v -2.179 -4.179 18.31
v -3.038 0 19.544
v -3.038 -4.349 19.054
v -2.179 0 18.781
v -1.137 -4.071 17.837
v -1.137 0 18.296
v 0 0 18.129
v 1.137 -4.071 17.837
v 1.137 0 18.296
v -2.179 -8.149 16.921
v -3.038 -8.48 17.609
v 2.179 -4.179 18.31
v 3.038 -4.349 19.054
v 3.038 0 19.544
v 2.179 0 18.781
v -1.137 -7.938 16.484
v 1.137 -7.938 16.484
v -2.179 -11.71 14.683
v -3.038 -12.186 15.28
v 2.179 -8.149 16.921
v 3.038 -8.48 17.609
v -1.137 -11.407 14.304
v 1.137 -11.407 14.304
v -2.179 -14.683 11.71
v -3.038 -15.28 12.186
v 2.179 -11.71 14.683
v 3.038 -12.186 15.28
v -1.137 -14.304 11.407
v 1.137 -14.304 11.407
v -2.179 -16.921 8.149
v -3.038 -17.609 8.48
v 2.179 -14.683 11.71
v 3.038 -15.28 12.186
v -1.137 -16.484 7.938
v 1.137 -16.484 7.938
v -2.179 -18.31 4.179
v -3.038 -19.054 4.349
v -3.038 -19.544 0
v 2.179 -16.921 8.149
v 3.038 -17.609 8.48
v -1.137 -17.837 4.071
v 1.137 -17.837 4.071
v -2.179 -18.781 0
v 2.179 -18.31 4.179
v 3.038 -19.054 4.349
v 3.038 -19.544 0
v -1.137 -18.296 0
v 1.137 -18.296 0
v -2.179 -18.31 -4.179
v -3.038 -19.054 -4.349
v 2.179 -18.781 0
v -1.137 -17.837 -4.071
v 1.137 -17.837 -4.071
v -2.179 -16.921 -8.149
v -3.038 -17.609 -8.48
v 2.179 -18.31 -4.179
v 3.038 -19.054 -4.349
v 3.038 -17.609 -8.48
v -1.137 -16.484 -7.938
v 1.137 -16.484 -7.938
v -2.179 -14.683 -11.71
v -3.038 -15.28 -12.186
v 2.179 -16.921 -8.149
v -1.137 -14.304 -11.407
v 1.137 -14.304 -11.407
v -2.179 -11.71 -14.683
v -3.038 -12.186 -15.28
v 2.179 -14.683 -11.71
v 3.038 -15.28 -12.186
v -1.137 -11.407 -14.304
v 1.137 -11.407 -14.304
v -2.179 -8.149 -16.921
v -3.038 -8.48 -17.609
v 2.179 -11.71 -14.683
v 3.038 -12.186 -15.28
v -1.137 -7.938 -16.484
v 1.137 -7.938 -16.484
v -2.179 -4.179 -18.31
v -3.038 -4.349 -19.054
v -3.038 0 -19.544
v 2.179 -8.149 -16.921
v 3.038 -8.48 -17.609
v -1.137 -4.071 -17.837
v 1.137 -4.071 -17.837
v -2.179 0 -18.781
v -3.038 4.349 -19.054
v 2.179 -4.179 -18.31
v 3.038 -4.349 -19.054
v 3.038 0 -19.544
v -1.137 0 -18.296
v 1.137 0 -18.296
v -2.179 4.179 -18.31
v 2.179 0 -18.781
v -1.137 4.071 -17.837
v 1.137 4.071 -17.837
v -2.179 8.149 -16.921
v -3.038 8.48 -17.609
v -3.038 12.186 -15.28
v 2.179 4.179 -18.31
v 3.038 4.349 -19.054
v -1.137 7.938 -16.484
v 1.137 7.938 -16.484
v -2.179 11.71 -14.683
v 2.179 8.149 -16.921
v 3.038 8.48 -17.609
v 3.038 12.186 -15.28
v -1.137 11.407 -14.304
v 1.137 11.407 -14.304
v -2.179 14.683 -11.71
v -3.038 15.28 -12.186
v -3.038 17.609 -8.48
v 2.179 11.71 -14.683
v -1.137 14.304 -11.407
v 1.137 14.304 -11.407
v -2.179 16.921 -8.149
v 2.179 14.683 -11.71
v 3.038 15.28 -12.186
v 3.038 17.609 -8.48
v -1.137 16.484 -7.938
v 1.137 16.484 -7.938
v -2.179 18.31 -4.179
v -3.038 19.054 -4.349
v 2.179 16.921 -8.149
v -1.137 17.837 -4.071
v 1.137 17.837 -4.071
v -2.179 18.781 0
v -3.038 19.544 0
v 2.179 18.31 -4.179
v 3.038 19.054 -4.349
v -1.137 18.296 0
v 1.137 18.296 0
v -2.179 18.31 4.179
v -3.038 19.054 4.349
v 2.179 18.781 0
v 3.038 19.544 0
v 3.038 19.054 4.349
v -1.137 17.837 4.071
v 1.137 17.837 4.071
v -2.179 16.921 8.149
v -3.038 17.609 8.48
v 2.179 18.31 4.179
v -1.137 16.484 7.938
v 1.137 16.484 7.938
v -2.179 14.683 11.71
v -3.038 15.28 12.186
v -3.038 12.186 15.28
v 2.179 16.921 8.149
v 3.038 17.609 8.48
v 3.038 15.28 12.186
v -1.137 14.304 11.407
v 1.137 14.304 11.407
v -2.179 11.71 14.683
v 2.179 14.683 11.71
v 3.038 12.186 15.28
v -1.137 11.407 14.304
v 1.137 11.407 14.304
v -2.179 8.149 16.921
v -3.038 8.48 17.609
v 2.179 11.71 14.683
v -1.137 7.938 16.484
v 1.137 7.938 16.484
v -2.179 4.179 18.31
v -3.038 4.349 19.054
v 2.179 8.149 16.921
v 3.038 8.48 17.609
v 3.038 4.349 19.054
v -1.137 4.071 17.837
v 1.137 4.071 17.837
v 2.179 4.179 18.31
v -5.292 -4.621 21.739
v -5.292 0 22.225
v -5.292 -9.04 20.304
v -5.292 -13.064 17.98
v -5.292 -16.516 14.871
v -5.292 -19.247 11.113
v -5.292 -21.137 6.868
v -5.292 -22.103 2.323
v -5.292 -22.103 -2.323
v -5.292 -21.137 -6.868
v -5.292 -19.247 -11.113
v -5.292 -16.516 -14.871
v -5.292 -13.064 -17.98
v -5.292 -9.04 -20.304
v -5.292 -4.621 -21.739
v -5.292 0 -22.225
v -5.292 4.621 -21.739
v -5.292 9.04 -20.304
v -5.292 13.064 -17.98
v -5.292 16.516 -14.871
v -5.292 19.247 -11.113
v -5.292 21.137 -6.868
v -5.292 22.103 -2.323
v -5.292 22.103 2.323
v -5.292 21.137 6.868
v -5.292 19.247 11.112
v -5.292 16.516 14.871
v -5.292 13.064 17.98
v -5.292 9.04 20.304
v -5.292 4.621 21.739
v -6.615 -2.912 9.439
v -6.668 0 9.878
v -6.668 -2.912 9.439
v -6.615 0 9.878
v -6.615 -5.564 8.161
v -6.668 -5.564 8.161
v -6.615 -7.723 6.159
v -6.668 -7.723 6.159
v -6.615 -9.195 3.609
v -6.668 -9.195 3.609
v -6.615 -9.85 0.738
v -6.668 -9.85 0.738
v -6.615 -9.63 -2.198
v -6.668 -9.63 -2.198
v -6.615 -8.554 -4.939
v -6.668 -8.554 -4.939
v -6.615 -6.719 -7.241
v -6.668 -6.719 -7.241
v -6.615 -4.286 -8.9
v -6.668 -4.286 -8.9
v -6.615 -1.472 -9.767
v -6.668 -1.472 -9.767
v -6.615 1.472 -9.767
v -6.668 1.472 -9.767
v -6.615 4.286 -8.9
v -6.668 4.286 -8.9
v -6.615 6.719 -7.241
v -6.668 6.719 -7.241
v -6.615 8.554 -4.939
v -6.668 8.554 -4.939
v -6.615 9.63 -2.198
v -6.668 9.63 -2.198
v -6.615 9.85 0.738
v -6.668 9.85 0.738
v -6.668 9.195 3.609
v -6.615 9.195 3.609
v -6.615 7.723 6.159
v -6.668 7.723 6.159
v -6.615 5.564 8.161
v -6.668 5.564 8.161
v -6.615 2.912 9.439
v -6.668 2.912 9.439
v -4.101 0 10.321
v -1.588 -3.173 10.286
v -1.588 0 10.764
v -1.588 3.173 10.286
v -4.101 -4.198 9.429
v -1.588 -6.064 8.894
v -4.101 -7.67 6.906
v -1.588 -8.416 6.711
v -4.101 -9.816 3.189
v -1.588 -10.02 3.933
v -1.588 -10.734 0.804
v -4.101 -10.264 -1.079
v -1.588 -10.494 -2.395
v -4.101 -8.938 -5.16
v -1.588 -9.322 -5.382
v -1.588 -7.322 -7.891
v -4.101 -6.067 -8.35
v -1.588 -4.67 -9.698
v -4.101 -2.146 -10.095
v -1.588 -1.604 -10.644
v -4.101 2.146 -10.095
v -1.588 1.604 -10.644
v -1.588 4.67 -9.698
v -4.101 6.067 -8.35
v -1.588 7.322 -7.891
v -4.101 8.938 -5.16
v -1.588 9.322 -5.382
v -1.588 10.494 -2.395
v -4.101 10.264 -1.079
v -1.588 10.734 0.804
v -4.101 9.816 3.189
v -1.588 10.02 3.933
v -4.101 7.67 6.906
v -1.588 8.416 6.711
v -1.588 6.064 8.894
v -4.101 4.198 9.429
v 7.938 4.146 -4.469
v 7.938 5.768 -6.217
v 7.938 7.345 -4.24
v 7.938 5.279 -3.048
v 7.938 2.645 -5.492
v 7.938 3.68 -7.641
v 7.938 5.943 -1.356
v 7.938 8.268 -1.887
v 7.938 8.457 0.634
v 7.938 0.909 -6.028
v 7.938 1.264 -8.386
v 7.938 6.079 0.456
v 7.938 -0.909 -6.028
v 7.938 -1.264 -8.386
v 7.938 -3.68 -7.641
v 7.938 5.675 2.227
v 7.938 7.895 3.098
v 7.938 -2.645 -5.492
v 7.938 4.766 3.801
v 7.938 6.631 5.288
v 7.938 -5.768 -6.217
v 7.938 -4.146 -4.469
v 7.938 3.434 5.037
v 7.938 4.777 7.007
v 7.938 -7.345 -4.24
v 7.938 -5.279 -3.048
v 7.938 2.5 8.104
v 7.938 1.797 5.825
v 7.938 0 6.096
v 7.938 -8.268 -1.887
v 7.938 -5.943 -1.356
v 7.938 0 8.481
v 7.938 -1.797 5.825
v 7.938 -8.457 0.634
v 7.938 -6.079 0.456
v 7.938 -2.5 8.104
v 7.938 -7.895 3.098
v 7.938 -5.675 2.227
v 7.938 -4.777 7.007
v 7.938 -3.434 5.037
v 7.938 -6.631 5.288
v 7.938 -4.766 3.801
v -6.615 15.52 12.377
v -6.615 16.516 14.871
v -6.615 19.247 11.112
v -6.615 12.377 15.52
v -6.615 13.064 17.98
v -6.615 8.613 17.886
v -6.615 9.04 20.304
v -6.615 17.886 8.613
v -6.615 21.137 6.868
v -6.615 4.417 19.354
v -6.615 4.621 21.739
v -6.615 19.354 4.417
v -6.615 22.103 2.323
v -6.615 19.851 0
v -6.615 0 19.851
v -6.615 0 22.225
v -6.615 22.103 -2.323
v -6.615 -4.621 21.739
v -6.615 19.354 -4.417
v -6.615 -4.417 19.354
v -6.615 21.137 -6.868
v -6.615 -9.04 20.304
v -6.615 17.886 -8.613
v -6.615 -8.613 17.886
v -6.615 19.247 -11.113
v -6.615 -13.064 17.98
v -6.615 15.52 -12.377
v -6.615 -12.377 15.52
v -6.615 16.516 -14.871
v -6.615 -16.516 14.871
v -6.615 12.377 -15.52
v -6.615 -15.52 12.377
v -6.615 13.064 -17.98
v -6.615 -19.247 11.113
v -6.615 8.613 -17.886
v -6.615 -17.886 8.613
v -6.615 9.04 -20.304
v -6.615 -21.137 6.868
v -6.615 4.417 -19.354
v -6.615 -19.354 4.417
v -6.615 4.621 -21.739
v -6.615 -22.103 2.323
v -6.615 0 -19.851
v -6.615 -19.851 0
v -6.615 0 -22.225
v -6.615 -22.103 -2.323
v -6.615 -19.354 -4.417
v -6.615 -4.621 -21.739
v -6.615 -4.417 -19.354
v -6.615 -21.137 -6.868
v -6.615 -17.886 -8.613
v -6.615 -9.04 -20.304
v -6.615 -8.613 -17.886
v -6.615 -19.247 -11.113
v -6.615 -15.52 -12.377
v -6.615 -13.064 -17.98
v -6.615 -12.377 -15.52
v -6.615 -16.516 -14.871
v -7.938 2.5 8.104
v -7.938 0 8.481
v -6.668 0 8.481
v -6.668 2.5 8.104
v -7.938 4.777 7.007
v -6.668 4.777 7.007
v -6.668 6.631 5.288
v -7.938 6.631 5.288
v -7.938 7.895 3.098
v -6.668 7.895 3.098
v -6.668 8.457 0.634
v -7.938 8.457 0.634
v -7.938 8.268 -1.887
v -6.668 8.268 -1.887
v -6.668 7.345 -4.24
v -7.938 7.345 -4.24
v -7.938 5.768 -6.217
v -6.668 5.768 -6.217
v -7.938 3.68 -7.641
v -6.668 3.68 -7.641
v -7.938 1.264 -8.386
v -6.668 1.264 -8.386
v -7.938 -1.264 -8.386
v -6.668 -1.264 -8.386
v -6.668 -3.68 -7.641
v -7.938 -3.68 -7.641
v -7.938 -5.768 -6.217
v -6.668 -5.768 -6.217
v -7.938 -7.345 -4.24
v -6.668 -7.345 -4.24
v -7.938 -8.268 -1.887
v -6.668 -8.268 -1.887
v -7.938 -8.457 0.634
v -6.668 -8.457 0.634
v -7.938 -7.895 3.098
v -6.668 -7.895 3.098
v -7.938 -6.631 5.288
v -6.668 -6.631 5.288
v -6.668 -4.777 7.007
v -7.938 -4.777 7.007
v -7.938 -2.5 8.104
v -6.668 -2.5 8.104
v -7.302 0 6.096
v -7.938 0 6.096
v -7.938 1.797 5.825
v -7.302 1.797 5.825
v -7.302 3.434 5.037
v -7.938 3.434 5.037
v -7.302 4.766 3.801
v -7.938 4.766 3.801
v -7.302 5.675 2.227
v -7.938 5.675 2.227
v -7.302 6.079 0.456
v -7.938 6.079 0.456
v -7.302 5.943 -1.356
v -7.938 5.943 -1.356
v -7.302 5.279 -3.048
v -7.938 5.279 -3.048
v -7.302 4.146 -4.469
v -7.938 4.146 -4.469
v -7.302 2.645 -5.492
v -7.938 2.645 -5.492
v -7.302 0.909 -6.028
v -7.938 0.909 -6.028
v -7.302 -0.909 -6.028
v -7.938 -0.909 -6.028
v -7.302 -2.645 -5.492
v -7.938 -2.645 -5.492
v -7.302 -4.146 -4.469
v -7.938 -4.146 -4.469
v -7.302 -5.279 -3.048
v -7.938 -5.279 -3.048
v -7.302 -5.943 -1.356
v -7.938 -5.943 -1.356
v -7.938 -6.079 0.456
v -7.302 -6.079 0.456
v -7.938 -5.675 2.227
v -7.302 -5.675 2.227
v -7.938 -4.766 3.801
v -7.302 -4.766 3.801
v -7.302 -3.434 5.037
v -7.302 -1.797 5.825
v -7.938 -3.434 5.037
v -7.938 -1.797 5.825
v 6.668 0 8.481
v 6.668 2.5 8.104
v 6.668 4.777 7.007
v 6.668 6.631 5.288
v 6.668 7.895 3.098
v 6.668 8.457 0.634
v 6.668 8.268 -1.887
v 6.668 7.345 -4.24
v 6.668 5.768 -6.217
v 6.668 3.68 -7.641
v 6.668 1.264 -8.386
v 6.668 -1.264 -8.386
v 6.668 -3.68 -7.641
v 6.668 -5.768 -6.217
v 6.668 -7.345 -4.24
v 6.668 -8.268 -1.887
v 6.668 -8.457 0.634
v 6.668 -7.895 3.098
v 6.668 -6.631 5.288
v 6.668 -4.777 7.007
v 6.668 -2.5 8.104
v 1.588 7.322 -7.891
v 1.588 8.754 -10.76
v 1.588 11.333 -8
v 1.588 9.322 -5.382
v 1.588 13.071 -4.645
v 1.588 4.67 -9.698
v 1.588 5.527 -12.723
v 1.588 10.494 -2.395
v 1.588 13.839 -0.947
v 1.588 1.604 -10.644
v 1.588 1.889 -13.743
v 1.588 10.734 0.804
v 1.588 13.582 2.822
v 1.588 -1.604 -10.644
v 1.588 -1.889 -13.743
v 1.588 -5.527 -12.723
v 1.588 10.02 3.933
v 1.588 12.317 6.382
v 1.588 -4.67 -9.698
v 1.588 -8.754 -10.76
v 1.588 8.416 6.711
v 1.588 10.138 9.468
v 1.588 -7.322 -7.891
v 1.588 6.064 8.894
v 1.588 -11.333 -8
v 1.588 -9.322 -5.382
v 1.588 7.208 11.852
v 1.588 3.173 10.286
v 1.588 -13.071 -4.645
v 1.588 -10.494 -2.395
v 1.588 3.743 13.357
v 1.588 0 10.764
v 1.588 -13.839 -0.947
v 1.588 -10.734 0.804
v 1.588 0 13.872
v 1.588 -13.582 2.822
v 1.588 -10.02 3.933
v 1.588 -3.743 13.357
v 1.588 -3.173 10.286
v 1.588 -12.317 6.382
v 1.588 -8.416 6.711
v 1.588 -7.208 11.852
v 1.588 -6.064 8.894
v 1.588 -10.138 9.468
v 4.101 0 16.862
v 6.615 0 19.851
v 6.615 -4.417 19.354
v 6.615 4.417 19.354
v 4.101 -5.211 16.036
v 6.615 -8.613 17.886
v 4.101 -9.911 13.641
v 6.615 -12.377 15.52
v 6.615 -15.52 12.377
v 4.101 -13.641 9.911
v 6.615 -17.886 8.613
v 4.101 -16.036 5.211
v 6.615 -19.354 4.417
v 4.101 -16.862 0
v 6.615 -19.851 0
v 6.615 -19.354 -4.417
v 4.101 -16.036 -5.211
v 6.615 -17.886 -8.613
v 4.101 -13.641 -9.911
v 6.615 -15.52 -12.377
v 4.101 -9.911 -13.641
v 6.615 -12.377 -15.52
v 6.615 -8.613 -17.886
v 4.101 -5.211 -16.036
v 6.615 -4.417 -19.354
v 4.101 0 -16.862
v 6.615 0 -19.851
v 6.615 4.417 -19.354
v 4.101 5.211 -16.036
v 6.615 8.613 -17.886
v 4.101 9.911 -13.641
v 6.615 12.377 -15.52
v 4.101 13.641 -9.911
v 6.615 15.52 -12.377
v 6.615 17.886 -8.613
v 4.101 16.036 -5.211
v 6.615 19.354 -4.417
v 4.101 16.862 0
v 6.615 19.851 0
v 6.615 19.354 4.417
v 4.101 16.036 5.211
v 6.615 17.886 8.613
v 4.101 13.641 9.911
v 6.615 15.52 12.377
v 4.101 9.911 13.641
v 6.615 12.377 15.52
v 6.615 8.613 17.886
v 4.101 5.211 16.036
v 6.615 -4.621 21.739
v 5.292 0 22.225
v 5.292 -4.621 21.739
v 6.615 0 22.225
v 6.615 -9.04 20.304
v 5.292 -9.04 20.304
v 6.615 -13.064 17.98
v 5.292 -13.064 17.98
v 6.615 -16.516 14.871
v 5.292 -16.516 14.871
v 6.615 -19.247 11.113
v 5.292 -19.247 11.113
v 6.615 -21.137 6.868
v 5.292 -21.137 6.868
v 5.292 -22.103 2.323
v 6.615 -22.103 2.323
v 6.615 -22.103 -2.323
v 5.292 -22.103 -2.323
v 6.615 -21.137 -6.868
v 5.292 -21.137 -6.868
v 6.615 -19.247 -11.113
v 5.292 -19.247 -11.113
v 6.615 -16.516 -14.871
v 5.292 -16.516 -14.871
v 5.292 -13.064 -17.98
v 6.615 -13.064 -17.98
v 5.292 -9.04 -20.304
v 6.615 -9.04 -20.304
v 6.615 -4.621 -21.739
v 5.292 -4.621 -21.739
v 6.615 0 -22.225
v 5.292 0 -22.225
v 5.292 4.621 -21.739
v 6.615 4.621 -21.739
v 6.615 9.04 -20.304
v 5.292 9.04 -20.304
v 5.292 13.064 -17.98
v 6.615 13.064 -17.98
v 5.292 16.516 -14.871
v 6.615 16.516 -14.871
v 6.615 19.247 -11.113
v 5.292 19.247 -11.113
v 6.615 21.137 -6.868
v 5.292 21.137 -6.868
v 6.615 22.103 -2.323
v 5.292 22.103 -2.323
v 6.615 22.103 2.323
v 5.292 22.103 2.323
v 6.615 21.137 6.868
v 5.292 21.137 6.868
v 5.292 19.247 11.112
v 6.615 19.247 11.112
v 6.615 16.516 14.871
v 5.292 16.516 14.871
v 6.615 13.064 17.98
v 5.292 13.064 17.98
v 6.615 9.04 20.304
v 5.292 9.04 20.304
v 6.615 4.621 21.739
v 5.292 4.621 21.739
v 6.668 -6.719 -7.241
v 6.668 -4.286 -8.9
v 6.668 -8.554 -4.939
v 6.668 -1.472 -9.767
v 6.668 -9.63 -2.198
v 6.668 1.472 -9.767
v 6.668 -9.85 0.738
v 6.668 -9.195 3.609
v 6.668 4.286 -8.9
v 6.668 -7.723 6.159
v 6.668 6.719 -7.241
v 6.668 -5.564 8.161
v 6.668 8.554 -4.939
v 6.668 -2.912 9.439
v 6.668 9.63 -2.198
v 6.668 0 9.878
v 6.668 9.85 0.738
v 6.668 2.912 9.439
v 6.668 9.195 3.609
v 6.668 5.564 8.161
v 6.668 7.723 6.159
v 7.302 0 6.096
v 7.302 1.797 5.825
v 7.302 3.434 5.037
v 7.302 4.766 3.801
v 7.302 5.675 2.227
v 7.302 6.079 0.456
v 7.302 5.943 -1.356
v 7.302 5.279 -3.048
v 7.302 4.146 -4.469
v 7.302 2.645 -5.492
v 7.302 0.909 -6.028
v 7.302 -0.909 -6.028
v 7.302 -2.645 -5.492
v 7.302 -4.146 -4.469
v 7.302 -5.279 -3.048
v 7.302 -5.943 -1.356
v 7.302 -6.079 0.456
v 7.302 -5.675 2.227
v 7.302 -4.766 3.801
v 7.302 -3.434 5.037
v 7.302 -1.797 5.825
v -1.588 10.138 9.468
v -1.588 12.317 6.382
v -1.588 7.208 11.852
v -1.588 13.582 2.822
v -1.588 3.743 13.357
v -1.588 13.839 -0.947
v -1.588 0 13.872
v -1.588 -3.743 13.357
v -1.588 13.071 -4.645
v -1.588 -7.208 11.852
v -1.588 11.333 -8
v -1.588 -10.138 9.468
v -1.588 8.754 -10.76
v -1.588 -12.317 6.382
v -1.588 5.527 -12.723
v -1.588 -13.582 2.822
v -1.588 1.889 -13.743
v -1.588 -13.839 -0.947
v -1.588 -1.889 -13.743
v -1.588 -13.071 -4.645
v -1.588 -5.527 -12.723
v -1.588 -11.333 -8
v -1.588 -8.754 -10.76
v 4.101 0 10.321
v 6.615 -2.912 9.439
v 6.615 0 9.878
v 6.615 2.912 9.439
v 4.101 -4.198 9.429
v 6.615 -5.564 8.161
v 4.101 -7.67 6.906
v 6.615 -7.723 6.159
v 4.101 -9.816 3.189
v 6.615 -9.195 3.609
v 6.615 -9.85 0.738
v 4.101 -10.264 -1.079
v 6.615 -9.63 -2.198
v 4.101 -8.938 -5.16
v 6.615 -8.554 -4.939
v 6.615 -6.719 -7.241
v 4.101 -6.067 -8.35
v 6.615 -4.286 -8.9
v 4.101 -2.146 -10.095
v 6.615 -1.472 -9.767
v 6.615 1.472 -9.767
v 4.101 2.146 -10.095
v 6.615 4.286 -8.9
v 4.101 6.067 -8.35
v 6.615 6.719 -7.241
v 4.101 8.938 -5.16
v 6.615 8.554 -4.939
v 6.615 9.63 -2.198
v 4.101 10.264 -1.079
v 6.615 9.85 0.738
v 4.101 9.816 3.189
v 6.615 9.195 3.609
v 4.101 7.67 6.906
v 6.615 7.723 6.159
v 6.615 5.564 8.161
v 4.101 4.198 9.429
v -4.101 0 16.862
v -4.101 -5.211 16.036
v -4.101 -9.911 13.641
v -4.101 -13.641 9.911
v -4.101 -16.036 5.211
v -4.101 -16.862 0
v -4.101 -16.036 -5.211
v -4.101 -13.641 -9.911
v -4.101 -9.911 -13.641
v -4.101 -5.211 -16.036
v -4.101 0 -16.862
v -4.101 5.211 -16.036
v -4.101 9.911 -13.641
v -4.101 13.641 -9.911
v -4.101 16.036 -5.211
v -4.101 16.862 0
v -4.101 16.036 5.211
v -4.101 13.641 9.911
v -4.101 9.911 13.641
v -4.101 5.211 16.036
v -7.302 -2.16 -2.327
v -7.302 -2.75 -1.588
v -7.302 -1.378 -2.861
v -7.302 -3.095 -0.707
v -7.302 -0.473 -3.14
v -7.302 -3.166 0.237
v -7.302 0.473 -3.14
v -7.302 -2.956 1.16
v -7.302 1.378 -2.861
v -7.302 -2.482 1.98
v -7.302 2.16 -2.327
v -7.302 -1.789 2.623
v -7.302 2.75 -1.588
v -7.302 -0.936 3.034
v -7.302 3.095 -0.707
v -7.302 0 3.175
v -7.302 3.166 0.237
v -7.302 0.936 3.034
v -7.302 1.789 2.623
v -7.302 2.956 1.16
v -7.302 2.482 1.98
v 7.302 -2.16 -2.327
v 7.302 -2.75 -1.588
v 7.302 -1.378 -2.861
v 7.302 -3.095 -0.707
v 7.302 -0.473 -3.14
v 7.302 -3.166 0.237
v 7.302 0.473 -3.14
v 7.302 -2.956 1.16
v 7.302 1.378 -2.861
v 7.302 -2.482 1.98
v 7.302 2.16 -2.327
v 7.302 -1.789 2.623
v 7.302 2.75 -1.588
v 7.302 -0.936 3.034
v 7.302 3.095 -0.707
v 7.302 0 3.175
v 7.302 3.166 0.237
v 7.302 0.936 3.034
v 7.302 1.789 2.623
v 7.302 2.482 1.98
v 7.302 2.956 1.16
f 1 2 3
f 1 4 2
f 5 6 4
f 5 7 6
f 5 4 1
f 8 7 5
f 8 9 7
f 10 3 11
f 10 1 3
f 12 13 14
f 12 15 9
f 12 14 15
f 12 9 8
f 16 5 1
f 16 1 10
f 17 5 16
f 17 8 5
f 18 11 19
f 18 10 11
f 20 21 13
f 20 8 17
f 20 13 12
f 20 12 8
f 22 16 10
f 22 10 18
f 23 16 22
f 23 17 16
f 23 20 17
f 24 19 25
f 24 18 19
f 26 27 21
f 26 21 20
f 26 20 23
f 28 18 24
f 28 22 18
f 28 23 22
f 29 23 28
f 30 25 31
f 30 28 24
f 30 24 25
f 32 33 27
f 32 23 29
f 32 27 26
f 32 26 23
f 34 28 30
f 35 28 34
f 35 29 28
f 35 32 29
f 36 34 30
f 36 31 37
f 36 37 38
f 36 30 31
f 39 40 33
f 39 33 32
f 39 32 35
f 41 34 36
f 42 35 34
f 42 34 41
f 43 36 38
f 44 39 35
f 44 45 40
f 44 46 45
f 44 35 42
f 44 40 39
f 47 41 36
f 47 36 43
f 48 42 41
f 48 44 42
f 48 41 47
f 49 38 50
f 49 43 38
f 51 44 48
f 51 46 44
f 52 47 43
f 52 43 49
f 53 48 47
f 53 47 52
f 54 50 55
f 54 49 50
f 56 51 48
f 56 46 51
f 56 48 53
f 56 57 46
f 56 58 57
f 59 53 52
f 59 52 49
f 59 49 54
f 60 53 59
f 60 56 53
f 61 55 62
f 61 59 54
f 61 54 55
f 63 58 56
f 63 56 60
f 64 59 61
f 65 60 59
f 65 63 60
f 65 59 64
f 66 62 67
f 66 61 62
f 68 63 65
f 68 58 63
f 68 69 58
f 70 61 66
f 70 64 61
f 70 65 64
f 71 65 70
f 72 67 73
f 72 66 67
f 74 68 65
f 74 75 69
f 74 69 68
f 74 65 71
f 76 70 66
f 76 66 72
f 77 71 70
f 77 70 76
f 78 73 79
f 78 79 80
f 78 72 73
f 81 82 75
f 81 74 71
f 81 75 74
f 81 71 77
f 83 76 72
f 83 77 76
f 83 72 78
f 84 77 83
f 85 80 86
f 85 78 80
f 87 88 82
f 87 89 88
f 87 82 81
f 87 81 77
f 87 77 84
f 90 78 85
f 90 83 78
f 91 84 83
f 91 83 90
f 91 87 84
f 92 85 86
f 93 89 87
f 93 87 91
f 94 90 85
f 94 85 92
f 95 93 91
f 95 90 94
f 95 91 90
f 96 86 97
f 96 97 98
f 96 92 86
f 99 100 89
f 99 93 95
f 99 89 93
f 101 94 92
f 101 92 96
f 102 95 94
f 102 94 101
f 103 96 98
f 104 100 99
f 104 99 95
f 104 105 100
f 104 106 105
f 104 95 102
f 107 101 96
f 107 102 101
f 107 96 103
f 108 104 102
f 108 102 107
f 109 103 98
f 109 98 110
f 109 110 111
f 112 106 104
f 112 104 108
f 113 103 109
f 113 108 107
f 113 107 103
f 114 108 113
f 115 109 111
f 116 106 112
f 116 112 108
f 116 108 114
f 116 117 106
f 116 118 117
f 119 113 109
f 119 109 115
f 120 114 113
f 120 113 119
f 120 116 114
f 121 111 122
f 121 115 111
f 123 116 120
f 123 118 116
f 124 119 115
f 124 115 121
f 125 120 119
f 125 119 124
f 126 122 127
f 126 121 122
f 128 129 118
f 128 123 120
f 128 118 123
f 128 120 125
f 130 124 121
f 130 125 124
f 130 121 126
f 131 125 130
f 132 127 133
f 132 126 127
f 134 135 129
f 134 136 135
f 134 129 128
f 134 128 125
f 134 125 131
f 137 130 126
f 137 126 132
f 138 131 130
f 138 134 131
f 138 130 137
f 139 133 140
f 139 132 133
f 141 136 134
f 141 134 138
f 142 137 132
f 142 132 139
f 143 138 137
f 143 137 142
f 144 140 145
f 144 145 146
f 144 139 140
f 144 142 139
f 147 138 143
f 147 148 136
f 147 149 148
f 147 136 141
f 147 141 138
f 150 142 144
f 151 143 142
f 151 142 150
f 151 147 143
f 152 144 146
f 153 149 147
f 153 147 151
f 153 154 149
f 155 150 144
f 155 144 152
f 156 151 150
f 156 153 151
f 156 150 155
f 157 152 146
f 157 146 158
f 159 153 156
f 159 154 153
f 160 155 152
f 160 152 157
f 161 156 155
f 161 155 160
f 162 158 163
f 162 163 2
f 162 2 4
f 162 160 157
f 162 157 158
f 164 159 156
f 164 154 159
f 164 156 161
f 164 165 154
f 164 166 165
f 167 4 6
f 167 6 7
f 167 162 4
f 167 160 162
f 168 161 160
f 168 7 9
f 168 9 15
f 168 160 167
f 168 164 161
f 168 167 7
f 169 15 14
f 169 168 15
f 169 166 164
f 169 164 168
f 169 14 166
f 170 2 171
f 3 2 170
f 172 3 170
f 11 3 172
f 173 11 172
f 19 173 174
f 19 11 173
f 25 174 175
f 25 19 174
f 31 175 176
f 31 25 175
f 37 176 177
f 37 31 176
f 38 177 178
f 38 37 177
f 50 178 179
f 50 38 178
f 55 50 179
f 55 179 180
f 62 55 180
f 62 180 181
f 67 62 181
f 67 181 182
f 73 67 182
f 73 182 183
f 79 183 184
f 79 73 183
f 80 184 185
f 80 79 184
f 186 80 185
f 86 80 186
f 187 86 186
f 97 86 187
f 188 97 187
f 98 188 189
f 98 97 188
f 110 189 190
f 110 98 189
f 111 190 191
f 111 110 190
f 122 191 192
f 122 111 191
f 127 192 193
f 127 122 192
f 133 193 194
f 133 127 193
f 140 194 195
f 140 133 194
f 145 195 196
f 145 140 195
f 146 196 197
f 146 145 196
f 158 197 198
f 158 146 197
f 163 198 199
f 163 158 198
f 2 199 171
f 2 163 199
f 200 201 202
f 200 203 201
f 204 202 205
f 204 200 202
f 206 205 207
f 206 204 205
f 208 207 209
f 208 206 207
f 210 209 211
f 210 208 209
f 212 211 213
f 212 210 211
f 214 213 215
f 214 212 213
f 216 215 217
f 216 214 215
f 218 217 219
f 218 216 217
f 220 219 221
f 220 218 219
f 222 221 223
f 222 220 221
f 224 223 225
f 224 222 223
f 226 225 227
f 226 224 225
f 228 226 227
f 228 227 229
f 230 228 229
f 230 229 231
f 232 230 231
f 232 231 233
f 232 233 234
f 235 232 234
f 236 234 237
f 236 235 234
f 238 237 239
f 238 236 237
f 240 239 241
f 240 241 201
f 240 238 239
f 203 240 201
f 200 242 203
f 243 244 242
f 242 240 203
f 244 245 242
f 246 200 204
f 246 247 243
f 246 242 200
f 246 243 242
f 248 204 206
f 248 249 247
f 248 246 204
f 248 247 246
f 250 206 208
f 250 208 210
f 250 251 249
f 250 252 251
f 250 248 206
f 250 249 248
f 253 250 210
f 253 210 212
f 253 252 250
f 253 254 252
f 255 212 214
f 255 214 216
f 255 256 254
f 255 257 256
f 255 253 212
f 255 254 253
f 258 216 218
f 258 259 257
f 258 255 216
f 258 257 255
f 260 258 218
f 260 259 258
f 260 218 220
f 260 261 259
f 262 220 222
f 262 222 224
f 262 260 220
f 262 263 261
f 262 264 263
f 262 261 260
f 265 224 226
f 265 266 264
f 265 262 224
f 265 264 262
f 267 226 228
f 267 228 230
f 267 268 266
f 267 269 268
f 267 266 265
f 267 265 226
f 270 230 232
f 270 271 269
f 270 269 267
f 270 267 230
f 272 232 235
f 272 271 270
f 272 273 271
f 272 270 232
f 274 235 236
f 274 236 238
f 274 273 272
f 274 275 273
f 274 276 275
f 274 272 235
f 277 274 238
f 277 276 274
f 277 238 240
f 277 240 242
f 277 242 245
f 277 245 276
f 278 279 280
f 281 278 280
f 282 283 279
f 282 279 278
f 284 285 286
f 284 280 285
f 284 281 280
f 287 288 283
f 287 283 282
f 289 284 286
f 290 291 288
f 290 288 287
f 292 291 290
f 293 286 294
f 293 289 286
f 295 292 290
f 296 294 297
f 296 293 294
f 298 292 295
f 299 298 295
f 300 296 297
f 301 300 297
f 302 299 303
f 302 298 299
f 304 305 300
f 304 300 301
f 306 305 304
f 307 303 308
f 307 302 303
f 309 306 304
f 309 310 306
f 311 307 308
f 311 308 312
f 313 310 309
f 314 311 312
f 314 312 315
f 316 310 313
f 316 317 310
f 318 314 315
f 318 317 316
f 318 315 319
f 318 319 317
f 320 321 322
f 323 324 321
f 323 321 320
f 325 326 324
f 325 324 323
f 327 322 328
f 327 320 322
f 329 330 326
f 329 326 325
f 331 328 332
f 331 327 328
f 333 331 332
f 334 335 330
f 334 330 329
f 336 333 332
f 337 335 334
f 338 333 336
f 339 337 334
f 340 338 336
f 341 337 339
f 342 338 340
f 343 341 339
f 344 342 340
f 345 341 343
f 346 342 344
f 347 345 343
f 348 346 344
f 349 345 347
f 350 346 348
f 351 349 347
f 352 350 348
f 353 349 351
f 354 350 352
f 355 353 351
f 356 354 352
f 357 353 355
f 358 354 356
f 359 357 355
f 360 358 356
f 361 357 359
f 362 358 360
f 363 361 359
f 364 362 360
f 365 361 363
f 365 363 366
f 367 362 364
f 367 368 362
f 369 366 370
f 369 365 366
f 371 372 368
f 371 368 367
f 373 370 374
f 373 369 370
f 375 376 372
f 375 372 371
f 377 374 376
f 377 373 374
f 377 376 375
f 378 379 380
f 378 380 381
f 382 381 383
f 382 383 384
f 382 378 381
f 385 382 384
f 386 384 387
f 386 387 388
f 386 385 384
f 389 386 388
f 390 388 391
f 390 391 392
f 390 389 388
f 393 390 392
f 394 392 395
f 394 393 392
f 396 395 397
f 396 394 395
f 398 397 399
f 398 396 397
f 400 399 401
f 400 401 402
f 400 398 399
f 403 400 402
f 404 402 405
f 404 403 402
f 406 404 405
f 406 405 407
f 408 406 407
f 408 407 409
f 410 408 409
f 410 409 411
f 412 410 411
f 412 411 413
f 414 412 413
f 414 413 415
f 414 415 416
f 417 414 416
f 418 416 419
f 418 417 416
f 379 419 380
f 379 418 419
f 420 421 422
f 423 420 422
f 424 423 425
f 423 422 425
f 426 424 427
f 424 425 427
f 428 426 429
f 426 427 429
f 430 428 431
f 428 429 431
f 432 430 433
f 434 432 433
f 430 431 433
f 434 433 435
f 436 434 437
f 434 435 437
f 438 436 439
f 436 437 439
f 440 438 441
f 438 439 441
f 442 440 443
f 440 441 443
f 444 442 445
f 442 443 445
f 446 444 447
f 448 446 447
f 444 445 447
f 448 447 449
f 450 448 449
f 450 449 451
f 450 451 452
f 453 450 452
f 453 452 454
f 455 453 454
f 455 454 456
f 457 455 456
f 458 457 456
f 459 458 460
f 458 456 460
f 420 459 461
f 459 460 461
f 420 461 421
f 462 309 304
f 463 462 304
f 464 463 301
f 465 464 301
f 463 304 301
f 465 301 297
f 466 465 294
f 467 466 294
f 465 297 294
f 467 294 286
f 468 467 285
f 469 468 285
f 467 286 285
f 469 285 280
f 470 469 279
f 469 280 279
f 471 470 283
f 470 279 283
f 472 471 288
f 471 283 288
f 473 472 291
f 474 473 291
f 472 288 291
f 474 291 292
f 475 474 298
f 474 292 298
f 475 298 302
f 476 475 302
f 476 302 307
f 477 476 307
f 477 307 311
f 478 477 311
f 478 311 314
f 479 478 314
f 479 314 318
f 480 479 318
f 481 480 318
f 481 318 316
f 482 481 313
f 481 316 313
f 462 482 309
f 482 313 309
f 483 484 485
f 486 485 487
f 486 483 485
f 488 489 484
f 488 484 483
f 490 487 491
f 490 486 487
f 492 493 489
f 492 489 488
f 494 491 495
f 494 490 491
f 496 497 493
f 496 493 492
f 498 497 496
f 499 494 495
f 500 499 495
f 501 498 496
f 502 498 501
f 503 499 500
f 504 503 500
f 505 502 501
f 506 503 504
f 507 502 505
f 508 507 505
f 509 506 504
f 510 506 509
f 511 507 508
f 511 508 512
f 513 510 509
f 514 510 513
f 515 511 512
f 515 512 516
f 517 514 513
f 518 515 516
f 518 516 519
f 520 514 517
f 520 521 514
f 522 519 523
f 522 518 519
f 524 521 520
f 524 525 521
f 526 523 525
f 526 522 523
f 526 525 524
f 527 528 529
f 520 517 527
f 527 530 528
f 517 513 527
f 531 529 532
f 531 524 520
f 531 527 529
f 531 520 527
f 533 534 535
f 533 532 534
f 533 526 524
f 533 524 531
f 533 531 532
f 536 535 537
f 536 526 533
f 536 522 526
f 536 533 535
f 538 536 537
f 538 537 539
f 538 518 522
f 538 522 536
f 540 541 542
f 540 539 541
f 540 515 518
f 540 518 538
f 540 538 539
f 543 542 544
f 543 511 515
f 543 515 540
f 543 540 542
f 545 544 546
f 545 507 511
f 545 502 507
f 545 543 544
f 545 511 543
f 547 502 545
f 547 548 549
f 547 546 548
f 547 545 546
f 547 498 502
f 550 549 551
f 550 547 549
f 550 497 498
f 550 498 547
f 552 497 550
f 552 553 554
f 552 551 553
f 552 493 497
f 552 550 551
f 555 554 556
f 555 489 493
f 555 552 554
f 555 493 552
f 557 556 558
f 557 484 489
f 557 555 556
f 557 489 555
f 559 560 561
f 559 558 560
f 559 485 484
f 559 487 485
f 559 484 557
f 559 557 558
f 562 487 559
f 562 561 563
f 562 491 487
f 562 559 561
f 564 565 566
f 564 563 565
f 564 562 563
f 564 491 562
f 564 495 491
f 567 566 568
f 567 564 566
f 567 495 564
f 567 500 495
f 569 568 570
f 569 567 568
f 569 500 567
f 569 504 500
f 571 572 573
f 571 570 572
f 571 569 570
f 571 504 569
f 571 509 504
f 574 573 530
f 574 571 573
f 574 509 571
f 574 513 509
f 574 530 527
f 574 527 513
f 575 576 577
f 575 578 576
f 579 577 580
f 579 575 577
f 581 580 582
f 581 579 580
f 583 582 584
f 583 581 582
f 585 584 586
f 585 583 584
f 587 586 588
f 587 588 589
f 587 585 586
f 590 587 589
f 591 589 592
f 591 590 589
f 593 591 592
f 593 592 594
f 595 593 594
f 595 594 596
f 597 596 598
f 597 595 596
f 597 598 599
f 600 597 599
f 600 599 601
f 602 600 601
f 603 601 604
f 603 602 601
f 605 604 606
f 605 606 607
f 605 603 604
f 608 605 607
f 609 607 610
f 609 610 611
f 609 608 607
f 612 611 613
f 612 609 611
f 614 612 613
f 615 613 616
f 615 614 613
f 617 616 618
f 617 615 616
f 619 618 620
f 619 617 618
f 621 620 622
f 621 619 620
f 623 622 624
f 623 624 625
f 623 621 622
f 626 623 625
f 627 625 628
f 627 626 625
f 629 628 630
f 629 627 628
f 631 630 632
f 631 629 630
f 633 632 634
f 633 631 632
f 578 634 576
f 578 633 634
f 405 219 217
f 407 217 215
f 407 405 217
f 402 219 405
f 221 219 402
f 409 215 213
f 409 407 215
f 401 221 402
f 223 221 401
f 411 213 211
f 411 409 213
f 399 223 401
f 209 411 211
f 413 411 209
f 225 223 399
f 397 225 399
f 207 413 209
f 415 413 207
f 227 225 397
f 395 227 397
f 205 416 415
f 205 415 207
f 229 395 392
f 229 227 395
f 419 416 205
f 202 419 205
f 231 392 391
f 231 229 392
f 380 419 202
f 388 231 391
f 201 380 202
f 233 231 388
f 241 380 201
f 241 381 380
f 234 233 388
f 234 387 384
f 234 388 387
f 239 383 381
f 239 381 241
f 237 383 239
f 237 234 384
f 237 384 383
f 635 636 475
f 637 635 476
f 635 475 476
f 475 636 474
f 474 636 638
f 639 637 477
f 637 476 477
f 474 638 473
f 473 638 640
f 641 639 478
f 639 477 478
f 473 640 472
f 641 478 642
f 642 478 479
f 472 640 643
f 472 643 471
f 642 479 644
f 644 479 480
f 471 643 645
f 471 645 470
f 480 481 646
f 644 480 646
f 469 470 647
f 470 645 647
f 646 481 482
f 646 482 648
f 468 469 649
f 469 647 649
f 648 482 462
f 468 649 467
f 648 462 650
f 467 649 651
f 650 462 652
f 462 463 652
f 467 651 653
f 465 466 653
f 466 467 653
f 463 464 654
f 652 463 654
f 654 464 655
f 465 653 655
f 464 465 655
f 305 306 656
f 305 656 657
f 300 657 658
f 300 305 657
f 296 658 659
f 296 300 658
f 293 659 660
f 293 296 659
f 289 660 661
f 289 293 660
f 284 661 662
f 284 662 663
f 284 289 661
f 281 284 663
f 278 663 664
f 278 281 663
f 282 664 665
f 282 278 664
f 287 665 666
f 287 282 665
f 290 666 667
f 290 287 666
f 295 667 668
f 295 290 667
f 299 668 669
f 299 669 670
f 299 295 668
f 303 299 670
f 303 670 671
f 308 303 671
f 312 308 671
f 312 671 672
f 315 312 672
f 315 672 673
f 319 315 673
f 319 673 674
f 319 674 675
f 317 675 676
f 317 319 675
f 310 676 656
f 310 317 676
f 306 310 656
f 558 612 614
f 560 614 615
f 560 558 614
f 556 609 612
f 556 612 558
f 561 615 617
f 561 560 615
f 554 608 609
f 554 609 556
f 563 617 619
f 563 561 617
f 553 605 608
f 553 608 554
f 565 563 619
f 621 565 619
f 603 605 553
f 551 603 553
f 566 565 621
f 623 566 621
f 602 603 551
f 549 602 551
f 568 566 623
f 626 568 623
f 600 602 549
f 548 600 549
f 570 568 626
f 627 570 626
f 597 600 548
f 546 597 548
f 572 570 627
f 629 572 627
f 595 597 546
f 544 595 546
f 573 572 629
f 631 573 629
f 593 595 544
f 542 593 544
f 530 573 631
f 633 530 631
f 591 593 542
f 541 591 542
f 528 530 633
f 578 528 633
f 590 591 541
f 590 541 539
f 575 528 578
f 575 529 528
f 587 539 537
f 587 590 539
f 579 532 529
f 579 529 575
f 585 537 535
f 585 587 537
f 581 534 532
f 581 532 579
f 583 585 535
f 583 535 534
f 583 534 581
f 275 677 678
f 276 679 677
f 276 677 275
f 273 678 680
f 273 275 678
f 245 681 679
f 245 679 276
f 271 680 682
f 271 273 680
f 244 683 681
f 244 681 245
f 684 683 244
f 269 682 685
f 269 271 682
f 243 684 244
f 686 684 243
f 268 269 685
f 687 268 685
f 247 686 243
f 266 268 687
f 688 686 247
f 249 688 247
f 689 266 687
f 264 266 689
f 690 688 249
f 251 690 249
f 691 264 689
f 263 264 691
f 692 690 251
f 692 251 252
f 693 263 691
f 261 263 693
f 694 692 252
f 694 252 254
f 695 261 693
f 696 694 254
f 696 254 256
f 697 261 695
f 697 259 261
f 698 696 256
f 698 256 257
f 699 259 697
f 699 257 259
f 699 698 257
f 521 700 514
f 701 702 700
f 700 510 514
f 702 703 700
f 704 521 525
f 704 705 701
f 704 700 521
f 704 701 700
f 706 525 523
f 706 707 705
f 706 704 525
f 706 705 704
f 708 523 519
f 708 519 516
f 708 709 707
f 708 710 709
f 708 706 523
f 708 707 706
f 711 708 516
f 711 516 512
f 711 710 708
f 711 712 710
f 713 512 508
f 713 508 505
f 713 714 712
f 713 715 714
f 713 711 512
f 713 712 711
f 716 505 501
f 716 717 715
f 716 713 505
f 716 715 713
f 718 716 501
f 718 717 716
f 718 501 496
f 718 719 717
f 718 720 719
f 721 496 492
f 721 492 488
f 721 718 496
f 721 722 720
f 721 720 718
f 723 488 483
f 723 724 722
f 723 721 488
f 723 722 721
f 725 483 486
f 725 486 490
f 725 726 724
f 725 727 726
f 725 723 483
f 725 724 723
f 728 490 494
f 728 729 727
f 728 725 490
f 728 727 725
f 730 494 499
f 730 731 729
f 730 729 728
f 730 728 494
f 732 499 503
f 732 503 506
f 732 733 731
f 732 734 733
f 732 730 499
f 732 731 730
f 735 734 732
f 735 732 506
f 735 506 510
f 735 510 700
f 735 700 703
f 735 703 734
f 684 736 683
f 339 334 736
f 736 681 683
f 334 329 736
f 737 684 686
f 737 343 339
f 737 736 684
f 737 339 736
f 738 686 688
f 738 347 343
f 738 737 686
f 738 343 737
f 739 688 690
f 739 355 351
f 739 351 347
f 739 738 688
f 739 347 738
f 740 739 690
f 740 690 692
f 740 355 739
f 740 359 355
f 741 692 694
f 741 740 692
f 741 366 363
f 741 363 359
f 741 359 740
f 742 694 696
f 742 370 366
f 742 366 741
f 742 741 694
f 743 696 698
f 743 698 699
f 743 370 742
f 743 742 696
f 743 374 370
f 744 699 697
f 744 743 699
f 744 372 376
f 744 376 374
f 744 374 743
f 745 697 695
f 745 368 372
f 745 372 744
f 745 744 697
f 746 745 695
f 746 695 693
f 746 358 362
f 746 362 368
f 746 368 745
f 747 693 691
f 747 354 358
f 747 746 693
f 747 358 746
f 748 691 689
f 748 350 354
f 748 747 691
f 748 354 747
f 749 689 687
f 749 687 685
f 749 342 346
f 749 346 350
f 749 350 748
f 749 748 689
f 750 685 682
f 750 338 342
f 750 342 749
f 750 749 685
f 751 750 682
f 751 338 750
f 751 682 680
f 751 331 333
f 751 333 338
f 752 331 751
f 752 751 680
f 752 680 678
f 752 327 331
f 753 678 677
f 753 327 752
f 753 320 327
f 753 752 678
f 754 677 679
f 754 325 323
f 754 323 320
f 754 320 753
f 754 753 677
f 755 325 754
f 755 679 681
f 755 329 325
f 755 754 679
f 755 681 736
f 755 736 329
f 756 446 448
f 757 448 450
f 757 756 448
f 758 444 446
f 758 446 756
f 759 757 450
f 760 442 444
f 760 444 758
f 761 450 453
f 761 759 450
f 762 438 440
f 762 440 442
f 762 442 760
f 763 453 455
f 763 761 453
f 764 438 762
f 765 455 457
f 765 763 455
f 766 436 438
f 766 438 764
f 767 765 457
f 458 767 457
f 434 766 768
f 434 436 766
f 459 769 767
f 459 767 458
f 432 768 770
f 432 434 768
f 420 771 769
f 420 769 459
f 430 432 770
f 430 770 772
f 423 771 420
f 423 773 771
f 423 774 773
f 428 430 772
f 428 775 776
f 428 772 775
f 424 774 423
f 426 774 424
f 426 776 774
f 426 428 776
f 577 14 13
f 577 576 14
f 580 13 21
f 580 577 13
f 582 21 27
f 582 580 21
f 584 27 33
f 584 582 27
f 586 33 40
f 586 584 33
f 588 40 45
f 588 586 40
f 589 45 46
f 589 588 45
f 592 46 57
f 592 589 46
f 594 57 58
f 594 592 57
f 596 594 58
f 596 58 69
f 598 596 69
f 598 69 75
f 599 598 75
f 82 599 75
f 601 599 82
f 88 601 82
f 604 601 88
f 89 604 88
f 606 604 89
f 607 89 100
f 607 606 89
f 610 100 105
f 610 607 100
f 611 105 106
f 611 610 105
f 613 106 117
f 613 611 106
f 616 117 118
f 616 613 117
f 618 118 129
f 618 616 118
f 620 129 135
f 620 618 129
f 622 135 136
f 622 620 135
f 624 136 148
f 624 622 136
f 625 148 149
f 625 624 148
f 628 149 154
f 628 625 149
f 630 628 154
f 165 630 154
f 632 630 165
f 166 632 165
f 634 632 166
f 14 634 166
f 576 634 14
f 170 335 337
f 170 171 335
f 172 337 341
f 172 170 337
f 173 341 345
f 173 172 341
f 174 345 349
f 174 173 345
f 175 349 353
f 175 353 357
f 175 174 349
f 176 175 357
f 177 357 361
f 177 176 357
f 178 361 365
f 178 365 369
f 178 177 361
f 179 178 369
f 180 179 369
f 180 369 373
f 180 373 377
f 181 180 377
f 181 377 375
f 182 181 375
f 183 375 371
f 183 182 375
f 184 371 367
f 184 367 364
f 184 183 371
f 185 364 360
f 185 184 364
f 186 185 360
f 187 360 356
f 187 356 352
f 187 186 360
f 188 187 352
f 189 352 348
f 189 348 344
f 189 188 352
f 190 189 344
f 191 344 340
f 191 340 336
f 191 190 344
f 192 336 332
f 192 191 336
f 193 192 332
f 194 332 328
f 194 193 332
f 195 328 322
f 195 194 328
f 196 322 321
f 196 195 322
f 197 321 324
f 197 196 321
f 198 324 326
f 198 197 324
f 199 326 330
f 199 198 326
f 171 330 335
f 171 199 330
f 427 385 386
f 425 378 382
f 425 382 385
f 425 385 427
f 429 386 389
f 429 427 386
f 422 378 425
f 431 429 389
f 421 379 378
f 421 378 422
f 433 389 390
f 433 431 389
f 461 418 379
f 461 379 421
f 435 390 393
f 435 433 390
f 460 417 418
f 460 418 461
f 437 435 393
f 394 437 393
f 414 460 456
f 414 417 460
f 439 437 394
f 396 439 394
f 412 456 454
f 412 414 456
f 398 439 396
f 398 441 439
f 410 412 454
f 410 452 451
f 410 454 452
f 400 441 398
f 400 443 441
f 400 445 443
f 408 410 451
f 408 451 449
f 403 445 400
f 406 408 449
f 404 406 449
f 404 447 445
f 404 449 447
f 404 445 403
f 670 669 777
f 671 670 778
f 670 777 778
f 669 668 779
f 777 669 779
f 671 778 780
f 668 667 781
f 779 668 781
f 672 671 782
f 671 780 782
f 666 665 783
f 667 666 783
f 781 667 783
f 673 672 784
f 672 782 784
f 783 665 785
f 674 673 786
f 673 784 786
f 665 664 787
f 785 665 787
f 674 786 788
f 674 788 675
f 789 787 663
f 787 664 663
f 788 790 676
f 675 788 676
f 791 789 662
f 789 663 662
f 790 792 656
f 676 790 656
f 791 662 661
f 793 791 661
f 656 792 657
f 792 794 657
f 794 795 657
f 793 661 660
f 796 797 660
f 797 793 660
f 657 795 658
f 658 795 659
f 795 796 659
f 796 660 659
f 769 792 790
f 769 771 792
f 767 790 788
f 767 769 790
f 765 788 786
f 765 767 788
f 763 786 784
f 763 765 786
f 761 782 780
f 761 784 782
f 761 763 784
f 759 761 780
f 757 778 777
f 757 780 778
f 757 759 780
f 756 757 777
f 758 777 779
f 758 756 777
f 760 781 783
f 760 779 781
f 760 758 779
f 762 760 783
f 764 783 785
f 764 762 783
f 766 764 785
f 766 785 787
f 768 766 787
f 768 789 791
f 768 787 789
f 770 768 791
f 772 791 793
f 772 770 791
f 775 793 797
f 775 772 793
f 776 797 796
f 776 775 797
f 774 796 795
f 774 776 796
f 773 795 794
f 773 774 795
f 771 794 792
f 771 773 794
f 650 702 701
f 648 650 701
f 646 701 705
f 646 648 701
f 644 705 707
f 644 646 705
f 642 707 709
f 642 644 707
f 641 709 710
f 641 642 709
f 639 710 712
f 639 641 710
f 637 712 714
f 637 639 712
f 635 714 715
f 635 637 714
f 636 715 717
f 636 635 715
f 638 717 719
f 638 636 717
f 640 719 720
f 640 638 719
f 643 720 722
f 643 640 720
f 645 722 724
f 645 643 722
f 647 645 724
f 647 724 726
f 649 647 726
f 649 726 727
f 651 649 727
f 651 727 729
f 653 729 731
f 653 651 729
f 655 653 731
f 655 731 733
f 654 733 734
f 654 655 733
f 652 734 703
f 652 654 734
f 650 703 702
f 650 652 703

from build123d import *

# Parameters (mm, degrees)
SKETCH4_R          = 11.782777778
SKETCH4_R_2        = 8.480777778
CUT_EXTRUDE2_DEPTH = 1.27
SKETCH5_R          = 6.096
CUT_EXTRUDE3_DEPTH = 0.635


with BuildPart() as part:
    # Sketch1 → Revolve1 (revolve)
    with BuildSketch(Plane.XY, mode=Mode.PRIVATE) as revolve1_sk:
        with BuildLine():
            Line((5.291666667, 22.225), (6.614583333, 22.225))
            Line((6.614583333, 22.225), (6.614583333, 9.877777778))
            Line((6.614583333, 9.877777778), (7.9375, 9.877777778))
            Line((7.9375, 9.877777778), (7.9375, 3.175))
            Line((7.9375, 3.175), (-7.9375, 3.175))
            Line((-7.9375, 3.175), (-7.9375, 9.877777778))
            Line((-7.9375, 9.877777778), (-6.614583333, 9.877777778))
            Line((-6.614583333, 9.877777778), (-6.614583333, 22.225))
            Line((-6.614583333, 22.225), (-5.291666667, 22.225))
            Line((-5.291666667, 22.225), (-3.037856108, 19.544099682))
            ThreePointArc((-3.037856108, 19.544099682), (0, 18.12925), (3.037856108, 19.544099682))
            Line((3.037856108, 19.544099682), (5.291666667, 22.225))
        make_face()
    revolve(revolve1_sk.sketch.rotate(Axis((-7.9375, 0, 0), (1, 0, 0)), 90), axis=Axis((-7.9375, 0, 0), (1, 0, 0)))

    # Sketch2 → Cut-Revolve1 (revolve, cut)
    with BuildSketch(Plane.XY, mode=Mode.PRIVATE) as cut_revolve1_sk:
        Polygon((-7.9375, 9.877777778), (-6.614583333, 9.877777778), (-1.5875, 10.764188204), (-1.5875, 13.87175685), (-7.9375, 21.425061163), align=None)
        Polygon((7.9375, 9.877777778), (7.9375, 21.425061163), (1.5875, 13.87175685), (1.5875, 10.764188204), (6.614583333, 9.877777778), align=None)
    revolve(cut_revolve1_sk.sketch.rotate(Axis((-7.9375, 0, 0), (1, 0, 0)), 90), axis=Axis((-7.9375, 0, 0), (1, 0, 0)), mode=Mode.SUBTRACT)

    # Sketch4 → Cut-Extrude2 (cut)
    with BuildSketch(Plane.ZY.offset(7.9375)):
        Circle(SKETCH4_R)
        Circle(SKETCH4_R_2, mode=Mode.SUBTRACT)
    cut_extrude2 = extrude(amount=-CUT_EXTRUDE2_DEPTH, mode=Mode.SUBTRACT)

    # Sketch5 → Cut-Extrude3 (cut)
    with BuildSketch(Plane.ZY.offset(7.9375)):
        Circle(SKETCH5_R)
    cut_extrude3 = extrude(amount=-CUT_EXTRUDE3_DEPTH, mode=Mode.SUBTRACT)

    # Mirror1: Cut-Extrude2, Cut-Extrude3 across plane
    add(cut_extrude2.mirror(Plane(origin=(0, 0, 0), x_dir=(0, 0, 1), z_dir=(1, 0, 0))), mode=Mode.SUBTRACT)
    add(cut_extrude3.mirror(Plane(origin=(0, 0, 0), x_dir=(0, 0, 1), z_dir=(1, 0, 0))), mode=Mode.SUBTRACT)


solid = part.part
